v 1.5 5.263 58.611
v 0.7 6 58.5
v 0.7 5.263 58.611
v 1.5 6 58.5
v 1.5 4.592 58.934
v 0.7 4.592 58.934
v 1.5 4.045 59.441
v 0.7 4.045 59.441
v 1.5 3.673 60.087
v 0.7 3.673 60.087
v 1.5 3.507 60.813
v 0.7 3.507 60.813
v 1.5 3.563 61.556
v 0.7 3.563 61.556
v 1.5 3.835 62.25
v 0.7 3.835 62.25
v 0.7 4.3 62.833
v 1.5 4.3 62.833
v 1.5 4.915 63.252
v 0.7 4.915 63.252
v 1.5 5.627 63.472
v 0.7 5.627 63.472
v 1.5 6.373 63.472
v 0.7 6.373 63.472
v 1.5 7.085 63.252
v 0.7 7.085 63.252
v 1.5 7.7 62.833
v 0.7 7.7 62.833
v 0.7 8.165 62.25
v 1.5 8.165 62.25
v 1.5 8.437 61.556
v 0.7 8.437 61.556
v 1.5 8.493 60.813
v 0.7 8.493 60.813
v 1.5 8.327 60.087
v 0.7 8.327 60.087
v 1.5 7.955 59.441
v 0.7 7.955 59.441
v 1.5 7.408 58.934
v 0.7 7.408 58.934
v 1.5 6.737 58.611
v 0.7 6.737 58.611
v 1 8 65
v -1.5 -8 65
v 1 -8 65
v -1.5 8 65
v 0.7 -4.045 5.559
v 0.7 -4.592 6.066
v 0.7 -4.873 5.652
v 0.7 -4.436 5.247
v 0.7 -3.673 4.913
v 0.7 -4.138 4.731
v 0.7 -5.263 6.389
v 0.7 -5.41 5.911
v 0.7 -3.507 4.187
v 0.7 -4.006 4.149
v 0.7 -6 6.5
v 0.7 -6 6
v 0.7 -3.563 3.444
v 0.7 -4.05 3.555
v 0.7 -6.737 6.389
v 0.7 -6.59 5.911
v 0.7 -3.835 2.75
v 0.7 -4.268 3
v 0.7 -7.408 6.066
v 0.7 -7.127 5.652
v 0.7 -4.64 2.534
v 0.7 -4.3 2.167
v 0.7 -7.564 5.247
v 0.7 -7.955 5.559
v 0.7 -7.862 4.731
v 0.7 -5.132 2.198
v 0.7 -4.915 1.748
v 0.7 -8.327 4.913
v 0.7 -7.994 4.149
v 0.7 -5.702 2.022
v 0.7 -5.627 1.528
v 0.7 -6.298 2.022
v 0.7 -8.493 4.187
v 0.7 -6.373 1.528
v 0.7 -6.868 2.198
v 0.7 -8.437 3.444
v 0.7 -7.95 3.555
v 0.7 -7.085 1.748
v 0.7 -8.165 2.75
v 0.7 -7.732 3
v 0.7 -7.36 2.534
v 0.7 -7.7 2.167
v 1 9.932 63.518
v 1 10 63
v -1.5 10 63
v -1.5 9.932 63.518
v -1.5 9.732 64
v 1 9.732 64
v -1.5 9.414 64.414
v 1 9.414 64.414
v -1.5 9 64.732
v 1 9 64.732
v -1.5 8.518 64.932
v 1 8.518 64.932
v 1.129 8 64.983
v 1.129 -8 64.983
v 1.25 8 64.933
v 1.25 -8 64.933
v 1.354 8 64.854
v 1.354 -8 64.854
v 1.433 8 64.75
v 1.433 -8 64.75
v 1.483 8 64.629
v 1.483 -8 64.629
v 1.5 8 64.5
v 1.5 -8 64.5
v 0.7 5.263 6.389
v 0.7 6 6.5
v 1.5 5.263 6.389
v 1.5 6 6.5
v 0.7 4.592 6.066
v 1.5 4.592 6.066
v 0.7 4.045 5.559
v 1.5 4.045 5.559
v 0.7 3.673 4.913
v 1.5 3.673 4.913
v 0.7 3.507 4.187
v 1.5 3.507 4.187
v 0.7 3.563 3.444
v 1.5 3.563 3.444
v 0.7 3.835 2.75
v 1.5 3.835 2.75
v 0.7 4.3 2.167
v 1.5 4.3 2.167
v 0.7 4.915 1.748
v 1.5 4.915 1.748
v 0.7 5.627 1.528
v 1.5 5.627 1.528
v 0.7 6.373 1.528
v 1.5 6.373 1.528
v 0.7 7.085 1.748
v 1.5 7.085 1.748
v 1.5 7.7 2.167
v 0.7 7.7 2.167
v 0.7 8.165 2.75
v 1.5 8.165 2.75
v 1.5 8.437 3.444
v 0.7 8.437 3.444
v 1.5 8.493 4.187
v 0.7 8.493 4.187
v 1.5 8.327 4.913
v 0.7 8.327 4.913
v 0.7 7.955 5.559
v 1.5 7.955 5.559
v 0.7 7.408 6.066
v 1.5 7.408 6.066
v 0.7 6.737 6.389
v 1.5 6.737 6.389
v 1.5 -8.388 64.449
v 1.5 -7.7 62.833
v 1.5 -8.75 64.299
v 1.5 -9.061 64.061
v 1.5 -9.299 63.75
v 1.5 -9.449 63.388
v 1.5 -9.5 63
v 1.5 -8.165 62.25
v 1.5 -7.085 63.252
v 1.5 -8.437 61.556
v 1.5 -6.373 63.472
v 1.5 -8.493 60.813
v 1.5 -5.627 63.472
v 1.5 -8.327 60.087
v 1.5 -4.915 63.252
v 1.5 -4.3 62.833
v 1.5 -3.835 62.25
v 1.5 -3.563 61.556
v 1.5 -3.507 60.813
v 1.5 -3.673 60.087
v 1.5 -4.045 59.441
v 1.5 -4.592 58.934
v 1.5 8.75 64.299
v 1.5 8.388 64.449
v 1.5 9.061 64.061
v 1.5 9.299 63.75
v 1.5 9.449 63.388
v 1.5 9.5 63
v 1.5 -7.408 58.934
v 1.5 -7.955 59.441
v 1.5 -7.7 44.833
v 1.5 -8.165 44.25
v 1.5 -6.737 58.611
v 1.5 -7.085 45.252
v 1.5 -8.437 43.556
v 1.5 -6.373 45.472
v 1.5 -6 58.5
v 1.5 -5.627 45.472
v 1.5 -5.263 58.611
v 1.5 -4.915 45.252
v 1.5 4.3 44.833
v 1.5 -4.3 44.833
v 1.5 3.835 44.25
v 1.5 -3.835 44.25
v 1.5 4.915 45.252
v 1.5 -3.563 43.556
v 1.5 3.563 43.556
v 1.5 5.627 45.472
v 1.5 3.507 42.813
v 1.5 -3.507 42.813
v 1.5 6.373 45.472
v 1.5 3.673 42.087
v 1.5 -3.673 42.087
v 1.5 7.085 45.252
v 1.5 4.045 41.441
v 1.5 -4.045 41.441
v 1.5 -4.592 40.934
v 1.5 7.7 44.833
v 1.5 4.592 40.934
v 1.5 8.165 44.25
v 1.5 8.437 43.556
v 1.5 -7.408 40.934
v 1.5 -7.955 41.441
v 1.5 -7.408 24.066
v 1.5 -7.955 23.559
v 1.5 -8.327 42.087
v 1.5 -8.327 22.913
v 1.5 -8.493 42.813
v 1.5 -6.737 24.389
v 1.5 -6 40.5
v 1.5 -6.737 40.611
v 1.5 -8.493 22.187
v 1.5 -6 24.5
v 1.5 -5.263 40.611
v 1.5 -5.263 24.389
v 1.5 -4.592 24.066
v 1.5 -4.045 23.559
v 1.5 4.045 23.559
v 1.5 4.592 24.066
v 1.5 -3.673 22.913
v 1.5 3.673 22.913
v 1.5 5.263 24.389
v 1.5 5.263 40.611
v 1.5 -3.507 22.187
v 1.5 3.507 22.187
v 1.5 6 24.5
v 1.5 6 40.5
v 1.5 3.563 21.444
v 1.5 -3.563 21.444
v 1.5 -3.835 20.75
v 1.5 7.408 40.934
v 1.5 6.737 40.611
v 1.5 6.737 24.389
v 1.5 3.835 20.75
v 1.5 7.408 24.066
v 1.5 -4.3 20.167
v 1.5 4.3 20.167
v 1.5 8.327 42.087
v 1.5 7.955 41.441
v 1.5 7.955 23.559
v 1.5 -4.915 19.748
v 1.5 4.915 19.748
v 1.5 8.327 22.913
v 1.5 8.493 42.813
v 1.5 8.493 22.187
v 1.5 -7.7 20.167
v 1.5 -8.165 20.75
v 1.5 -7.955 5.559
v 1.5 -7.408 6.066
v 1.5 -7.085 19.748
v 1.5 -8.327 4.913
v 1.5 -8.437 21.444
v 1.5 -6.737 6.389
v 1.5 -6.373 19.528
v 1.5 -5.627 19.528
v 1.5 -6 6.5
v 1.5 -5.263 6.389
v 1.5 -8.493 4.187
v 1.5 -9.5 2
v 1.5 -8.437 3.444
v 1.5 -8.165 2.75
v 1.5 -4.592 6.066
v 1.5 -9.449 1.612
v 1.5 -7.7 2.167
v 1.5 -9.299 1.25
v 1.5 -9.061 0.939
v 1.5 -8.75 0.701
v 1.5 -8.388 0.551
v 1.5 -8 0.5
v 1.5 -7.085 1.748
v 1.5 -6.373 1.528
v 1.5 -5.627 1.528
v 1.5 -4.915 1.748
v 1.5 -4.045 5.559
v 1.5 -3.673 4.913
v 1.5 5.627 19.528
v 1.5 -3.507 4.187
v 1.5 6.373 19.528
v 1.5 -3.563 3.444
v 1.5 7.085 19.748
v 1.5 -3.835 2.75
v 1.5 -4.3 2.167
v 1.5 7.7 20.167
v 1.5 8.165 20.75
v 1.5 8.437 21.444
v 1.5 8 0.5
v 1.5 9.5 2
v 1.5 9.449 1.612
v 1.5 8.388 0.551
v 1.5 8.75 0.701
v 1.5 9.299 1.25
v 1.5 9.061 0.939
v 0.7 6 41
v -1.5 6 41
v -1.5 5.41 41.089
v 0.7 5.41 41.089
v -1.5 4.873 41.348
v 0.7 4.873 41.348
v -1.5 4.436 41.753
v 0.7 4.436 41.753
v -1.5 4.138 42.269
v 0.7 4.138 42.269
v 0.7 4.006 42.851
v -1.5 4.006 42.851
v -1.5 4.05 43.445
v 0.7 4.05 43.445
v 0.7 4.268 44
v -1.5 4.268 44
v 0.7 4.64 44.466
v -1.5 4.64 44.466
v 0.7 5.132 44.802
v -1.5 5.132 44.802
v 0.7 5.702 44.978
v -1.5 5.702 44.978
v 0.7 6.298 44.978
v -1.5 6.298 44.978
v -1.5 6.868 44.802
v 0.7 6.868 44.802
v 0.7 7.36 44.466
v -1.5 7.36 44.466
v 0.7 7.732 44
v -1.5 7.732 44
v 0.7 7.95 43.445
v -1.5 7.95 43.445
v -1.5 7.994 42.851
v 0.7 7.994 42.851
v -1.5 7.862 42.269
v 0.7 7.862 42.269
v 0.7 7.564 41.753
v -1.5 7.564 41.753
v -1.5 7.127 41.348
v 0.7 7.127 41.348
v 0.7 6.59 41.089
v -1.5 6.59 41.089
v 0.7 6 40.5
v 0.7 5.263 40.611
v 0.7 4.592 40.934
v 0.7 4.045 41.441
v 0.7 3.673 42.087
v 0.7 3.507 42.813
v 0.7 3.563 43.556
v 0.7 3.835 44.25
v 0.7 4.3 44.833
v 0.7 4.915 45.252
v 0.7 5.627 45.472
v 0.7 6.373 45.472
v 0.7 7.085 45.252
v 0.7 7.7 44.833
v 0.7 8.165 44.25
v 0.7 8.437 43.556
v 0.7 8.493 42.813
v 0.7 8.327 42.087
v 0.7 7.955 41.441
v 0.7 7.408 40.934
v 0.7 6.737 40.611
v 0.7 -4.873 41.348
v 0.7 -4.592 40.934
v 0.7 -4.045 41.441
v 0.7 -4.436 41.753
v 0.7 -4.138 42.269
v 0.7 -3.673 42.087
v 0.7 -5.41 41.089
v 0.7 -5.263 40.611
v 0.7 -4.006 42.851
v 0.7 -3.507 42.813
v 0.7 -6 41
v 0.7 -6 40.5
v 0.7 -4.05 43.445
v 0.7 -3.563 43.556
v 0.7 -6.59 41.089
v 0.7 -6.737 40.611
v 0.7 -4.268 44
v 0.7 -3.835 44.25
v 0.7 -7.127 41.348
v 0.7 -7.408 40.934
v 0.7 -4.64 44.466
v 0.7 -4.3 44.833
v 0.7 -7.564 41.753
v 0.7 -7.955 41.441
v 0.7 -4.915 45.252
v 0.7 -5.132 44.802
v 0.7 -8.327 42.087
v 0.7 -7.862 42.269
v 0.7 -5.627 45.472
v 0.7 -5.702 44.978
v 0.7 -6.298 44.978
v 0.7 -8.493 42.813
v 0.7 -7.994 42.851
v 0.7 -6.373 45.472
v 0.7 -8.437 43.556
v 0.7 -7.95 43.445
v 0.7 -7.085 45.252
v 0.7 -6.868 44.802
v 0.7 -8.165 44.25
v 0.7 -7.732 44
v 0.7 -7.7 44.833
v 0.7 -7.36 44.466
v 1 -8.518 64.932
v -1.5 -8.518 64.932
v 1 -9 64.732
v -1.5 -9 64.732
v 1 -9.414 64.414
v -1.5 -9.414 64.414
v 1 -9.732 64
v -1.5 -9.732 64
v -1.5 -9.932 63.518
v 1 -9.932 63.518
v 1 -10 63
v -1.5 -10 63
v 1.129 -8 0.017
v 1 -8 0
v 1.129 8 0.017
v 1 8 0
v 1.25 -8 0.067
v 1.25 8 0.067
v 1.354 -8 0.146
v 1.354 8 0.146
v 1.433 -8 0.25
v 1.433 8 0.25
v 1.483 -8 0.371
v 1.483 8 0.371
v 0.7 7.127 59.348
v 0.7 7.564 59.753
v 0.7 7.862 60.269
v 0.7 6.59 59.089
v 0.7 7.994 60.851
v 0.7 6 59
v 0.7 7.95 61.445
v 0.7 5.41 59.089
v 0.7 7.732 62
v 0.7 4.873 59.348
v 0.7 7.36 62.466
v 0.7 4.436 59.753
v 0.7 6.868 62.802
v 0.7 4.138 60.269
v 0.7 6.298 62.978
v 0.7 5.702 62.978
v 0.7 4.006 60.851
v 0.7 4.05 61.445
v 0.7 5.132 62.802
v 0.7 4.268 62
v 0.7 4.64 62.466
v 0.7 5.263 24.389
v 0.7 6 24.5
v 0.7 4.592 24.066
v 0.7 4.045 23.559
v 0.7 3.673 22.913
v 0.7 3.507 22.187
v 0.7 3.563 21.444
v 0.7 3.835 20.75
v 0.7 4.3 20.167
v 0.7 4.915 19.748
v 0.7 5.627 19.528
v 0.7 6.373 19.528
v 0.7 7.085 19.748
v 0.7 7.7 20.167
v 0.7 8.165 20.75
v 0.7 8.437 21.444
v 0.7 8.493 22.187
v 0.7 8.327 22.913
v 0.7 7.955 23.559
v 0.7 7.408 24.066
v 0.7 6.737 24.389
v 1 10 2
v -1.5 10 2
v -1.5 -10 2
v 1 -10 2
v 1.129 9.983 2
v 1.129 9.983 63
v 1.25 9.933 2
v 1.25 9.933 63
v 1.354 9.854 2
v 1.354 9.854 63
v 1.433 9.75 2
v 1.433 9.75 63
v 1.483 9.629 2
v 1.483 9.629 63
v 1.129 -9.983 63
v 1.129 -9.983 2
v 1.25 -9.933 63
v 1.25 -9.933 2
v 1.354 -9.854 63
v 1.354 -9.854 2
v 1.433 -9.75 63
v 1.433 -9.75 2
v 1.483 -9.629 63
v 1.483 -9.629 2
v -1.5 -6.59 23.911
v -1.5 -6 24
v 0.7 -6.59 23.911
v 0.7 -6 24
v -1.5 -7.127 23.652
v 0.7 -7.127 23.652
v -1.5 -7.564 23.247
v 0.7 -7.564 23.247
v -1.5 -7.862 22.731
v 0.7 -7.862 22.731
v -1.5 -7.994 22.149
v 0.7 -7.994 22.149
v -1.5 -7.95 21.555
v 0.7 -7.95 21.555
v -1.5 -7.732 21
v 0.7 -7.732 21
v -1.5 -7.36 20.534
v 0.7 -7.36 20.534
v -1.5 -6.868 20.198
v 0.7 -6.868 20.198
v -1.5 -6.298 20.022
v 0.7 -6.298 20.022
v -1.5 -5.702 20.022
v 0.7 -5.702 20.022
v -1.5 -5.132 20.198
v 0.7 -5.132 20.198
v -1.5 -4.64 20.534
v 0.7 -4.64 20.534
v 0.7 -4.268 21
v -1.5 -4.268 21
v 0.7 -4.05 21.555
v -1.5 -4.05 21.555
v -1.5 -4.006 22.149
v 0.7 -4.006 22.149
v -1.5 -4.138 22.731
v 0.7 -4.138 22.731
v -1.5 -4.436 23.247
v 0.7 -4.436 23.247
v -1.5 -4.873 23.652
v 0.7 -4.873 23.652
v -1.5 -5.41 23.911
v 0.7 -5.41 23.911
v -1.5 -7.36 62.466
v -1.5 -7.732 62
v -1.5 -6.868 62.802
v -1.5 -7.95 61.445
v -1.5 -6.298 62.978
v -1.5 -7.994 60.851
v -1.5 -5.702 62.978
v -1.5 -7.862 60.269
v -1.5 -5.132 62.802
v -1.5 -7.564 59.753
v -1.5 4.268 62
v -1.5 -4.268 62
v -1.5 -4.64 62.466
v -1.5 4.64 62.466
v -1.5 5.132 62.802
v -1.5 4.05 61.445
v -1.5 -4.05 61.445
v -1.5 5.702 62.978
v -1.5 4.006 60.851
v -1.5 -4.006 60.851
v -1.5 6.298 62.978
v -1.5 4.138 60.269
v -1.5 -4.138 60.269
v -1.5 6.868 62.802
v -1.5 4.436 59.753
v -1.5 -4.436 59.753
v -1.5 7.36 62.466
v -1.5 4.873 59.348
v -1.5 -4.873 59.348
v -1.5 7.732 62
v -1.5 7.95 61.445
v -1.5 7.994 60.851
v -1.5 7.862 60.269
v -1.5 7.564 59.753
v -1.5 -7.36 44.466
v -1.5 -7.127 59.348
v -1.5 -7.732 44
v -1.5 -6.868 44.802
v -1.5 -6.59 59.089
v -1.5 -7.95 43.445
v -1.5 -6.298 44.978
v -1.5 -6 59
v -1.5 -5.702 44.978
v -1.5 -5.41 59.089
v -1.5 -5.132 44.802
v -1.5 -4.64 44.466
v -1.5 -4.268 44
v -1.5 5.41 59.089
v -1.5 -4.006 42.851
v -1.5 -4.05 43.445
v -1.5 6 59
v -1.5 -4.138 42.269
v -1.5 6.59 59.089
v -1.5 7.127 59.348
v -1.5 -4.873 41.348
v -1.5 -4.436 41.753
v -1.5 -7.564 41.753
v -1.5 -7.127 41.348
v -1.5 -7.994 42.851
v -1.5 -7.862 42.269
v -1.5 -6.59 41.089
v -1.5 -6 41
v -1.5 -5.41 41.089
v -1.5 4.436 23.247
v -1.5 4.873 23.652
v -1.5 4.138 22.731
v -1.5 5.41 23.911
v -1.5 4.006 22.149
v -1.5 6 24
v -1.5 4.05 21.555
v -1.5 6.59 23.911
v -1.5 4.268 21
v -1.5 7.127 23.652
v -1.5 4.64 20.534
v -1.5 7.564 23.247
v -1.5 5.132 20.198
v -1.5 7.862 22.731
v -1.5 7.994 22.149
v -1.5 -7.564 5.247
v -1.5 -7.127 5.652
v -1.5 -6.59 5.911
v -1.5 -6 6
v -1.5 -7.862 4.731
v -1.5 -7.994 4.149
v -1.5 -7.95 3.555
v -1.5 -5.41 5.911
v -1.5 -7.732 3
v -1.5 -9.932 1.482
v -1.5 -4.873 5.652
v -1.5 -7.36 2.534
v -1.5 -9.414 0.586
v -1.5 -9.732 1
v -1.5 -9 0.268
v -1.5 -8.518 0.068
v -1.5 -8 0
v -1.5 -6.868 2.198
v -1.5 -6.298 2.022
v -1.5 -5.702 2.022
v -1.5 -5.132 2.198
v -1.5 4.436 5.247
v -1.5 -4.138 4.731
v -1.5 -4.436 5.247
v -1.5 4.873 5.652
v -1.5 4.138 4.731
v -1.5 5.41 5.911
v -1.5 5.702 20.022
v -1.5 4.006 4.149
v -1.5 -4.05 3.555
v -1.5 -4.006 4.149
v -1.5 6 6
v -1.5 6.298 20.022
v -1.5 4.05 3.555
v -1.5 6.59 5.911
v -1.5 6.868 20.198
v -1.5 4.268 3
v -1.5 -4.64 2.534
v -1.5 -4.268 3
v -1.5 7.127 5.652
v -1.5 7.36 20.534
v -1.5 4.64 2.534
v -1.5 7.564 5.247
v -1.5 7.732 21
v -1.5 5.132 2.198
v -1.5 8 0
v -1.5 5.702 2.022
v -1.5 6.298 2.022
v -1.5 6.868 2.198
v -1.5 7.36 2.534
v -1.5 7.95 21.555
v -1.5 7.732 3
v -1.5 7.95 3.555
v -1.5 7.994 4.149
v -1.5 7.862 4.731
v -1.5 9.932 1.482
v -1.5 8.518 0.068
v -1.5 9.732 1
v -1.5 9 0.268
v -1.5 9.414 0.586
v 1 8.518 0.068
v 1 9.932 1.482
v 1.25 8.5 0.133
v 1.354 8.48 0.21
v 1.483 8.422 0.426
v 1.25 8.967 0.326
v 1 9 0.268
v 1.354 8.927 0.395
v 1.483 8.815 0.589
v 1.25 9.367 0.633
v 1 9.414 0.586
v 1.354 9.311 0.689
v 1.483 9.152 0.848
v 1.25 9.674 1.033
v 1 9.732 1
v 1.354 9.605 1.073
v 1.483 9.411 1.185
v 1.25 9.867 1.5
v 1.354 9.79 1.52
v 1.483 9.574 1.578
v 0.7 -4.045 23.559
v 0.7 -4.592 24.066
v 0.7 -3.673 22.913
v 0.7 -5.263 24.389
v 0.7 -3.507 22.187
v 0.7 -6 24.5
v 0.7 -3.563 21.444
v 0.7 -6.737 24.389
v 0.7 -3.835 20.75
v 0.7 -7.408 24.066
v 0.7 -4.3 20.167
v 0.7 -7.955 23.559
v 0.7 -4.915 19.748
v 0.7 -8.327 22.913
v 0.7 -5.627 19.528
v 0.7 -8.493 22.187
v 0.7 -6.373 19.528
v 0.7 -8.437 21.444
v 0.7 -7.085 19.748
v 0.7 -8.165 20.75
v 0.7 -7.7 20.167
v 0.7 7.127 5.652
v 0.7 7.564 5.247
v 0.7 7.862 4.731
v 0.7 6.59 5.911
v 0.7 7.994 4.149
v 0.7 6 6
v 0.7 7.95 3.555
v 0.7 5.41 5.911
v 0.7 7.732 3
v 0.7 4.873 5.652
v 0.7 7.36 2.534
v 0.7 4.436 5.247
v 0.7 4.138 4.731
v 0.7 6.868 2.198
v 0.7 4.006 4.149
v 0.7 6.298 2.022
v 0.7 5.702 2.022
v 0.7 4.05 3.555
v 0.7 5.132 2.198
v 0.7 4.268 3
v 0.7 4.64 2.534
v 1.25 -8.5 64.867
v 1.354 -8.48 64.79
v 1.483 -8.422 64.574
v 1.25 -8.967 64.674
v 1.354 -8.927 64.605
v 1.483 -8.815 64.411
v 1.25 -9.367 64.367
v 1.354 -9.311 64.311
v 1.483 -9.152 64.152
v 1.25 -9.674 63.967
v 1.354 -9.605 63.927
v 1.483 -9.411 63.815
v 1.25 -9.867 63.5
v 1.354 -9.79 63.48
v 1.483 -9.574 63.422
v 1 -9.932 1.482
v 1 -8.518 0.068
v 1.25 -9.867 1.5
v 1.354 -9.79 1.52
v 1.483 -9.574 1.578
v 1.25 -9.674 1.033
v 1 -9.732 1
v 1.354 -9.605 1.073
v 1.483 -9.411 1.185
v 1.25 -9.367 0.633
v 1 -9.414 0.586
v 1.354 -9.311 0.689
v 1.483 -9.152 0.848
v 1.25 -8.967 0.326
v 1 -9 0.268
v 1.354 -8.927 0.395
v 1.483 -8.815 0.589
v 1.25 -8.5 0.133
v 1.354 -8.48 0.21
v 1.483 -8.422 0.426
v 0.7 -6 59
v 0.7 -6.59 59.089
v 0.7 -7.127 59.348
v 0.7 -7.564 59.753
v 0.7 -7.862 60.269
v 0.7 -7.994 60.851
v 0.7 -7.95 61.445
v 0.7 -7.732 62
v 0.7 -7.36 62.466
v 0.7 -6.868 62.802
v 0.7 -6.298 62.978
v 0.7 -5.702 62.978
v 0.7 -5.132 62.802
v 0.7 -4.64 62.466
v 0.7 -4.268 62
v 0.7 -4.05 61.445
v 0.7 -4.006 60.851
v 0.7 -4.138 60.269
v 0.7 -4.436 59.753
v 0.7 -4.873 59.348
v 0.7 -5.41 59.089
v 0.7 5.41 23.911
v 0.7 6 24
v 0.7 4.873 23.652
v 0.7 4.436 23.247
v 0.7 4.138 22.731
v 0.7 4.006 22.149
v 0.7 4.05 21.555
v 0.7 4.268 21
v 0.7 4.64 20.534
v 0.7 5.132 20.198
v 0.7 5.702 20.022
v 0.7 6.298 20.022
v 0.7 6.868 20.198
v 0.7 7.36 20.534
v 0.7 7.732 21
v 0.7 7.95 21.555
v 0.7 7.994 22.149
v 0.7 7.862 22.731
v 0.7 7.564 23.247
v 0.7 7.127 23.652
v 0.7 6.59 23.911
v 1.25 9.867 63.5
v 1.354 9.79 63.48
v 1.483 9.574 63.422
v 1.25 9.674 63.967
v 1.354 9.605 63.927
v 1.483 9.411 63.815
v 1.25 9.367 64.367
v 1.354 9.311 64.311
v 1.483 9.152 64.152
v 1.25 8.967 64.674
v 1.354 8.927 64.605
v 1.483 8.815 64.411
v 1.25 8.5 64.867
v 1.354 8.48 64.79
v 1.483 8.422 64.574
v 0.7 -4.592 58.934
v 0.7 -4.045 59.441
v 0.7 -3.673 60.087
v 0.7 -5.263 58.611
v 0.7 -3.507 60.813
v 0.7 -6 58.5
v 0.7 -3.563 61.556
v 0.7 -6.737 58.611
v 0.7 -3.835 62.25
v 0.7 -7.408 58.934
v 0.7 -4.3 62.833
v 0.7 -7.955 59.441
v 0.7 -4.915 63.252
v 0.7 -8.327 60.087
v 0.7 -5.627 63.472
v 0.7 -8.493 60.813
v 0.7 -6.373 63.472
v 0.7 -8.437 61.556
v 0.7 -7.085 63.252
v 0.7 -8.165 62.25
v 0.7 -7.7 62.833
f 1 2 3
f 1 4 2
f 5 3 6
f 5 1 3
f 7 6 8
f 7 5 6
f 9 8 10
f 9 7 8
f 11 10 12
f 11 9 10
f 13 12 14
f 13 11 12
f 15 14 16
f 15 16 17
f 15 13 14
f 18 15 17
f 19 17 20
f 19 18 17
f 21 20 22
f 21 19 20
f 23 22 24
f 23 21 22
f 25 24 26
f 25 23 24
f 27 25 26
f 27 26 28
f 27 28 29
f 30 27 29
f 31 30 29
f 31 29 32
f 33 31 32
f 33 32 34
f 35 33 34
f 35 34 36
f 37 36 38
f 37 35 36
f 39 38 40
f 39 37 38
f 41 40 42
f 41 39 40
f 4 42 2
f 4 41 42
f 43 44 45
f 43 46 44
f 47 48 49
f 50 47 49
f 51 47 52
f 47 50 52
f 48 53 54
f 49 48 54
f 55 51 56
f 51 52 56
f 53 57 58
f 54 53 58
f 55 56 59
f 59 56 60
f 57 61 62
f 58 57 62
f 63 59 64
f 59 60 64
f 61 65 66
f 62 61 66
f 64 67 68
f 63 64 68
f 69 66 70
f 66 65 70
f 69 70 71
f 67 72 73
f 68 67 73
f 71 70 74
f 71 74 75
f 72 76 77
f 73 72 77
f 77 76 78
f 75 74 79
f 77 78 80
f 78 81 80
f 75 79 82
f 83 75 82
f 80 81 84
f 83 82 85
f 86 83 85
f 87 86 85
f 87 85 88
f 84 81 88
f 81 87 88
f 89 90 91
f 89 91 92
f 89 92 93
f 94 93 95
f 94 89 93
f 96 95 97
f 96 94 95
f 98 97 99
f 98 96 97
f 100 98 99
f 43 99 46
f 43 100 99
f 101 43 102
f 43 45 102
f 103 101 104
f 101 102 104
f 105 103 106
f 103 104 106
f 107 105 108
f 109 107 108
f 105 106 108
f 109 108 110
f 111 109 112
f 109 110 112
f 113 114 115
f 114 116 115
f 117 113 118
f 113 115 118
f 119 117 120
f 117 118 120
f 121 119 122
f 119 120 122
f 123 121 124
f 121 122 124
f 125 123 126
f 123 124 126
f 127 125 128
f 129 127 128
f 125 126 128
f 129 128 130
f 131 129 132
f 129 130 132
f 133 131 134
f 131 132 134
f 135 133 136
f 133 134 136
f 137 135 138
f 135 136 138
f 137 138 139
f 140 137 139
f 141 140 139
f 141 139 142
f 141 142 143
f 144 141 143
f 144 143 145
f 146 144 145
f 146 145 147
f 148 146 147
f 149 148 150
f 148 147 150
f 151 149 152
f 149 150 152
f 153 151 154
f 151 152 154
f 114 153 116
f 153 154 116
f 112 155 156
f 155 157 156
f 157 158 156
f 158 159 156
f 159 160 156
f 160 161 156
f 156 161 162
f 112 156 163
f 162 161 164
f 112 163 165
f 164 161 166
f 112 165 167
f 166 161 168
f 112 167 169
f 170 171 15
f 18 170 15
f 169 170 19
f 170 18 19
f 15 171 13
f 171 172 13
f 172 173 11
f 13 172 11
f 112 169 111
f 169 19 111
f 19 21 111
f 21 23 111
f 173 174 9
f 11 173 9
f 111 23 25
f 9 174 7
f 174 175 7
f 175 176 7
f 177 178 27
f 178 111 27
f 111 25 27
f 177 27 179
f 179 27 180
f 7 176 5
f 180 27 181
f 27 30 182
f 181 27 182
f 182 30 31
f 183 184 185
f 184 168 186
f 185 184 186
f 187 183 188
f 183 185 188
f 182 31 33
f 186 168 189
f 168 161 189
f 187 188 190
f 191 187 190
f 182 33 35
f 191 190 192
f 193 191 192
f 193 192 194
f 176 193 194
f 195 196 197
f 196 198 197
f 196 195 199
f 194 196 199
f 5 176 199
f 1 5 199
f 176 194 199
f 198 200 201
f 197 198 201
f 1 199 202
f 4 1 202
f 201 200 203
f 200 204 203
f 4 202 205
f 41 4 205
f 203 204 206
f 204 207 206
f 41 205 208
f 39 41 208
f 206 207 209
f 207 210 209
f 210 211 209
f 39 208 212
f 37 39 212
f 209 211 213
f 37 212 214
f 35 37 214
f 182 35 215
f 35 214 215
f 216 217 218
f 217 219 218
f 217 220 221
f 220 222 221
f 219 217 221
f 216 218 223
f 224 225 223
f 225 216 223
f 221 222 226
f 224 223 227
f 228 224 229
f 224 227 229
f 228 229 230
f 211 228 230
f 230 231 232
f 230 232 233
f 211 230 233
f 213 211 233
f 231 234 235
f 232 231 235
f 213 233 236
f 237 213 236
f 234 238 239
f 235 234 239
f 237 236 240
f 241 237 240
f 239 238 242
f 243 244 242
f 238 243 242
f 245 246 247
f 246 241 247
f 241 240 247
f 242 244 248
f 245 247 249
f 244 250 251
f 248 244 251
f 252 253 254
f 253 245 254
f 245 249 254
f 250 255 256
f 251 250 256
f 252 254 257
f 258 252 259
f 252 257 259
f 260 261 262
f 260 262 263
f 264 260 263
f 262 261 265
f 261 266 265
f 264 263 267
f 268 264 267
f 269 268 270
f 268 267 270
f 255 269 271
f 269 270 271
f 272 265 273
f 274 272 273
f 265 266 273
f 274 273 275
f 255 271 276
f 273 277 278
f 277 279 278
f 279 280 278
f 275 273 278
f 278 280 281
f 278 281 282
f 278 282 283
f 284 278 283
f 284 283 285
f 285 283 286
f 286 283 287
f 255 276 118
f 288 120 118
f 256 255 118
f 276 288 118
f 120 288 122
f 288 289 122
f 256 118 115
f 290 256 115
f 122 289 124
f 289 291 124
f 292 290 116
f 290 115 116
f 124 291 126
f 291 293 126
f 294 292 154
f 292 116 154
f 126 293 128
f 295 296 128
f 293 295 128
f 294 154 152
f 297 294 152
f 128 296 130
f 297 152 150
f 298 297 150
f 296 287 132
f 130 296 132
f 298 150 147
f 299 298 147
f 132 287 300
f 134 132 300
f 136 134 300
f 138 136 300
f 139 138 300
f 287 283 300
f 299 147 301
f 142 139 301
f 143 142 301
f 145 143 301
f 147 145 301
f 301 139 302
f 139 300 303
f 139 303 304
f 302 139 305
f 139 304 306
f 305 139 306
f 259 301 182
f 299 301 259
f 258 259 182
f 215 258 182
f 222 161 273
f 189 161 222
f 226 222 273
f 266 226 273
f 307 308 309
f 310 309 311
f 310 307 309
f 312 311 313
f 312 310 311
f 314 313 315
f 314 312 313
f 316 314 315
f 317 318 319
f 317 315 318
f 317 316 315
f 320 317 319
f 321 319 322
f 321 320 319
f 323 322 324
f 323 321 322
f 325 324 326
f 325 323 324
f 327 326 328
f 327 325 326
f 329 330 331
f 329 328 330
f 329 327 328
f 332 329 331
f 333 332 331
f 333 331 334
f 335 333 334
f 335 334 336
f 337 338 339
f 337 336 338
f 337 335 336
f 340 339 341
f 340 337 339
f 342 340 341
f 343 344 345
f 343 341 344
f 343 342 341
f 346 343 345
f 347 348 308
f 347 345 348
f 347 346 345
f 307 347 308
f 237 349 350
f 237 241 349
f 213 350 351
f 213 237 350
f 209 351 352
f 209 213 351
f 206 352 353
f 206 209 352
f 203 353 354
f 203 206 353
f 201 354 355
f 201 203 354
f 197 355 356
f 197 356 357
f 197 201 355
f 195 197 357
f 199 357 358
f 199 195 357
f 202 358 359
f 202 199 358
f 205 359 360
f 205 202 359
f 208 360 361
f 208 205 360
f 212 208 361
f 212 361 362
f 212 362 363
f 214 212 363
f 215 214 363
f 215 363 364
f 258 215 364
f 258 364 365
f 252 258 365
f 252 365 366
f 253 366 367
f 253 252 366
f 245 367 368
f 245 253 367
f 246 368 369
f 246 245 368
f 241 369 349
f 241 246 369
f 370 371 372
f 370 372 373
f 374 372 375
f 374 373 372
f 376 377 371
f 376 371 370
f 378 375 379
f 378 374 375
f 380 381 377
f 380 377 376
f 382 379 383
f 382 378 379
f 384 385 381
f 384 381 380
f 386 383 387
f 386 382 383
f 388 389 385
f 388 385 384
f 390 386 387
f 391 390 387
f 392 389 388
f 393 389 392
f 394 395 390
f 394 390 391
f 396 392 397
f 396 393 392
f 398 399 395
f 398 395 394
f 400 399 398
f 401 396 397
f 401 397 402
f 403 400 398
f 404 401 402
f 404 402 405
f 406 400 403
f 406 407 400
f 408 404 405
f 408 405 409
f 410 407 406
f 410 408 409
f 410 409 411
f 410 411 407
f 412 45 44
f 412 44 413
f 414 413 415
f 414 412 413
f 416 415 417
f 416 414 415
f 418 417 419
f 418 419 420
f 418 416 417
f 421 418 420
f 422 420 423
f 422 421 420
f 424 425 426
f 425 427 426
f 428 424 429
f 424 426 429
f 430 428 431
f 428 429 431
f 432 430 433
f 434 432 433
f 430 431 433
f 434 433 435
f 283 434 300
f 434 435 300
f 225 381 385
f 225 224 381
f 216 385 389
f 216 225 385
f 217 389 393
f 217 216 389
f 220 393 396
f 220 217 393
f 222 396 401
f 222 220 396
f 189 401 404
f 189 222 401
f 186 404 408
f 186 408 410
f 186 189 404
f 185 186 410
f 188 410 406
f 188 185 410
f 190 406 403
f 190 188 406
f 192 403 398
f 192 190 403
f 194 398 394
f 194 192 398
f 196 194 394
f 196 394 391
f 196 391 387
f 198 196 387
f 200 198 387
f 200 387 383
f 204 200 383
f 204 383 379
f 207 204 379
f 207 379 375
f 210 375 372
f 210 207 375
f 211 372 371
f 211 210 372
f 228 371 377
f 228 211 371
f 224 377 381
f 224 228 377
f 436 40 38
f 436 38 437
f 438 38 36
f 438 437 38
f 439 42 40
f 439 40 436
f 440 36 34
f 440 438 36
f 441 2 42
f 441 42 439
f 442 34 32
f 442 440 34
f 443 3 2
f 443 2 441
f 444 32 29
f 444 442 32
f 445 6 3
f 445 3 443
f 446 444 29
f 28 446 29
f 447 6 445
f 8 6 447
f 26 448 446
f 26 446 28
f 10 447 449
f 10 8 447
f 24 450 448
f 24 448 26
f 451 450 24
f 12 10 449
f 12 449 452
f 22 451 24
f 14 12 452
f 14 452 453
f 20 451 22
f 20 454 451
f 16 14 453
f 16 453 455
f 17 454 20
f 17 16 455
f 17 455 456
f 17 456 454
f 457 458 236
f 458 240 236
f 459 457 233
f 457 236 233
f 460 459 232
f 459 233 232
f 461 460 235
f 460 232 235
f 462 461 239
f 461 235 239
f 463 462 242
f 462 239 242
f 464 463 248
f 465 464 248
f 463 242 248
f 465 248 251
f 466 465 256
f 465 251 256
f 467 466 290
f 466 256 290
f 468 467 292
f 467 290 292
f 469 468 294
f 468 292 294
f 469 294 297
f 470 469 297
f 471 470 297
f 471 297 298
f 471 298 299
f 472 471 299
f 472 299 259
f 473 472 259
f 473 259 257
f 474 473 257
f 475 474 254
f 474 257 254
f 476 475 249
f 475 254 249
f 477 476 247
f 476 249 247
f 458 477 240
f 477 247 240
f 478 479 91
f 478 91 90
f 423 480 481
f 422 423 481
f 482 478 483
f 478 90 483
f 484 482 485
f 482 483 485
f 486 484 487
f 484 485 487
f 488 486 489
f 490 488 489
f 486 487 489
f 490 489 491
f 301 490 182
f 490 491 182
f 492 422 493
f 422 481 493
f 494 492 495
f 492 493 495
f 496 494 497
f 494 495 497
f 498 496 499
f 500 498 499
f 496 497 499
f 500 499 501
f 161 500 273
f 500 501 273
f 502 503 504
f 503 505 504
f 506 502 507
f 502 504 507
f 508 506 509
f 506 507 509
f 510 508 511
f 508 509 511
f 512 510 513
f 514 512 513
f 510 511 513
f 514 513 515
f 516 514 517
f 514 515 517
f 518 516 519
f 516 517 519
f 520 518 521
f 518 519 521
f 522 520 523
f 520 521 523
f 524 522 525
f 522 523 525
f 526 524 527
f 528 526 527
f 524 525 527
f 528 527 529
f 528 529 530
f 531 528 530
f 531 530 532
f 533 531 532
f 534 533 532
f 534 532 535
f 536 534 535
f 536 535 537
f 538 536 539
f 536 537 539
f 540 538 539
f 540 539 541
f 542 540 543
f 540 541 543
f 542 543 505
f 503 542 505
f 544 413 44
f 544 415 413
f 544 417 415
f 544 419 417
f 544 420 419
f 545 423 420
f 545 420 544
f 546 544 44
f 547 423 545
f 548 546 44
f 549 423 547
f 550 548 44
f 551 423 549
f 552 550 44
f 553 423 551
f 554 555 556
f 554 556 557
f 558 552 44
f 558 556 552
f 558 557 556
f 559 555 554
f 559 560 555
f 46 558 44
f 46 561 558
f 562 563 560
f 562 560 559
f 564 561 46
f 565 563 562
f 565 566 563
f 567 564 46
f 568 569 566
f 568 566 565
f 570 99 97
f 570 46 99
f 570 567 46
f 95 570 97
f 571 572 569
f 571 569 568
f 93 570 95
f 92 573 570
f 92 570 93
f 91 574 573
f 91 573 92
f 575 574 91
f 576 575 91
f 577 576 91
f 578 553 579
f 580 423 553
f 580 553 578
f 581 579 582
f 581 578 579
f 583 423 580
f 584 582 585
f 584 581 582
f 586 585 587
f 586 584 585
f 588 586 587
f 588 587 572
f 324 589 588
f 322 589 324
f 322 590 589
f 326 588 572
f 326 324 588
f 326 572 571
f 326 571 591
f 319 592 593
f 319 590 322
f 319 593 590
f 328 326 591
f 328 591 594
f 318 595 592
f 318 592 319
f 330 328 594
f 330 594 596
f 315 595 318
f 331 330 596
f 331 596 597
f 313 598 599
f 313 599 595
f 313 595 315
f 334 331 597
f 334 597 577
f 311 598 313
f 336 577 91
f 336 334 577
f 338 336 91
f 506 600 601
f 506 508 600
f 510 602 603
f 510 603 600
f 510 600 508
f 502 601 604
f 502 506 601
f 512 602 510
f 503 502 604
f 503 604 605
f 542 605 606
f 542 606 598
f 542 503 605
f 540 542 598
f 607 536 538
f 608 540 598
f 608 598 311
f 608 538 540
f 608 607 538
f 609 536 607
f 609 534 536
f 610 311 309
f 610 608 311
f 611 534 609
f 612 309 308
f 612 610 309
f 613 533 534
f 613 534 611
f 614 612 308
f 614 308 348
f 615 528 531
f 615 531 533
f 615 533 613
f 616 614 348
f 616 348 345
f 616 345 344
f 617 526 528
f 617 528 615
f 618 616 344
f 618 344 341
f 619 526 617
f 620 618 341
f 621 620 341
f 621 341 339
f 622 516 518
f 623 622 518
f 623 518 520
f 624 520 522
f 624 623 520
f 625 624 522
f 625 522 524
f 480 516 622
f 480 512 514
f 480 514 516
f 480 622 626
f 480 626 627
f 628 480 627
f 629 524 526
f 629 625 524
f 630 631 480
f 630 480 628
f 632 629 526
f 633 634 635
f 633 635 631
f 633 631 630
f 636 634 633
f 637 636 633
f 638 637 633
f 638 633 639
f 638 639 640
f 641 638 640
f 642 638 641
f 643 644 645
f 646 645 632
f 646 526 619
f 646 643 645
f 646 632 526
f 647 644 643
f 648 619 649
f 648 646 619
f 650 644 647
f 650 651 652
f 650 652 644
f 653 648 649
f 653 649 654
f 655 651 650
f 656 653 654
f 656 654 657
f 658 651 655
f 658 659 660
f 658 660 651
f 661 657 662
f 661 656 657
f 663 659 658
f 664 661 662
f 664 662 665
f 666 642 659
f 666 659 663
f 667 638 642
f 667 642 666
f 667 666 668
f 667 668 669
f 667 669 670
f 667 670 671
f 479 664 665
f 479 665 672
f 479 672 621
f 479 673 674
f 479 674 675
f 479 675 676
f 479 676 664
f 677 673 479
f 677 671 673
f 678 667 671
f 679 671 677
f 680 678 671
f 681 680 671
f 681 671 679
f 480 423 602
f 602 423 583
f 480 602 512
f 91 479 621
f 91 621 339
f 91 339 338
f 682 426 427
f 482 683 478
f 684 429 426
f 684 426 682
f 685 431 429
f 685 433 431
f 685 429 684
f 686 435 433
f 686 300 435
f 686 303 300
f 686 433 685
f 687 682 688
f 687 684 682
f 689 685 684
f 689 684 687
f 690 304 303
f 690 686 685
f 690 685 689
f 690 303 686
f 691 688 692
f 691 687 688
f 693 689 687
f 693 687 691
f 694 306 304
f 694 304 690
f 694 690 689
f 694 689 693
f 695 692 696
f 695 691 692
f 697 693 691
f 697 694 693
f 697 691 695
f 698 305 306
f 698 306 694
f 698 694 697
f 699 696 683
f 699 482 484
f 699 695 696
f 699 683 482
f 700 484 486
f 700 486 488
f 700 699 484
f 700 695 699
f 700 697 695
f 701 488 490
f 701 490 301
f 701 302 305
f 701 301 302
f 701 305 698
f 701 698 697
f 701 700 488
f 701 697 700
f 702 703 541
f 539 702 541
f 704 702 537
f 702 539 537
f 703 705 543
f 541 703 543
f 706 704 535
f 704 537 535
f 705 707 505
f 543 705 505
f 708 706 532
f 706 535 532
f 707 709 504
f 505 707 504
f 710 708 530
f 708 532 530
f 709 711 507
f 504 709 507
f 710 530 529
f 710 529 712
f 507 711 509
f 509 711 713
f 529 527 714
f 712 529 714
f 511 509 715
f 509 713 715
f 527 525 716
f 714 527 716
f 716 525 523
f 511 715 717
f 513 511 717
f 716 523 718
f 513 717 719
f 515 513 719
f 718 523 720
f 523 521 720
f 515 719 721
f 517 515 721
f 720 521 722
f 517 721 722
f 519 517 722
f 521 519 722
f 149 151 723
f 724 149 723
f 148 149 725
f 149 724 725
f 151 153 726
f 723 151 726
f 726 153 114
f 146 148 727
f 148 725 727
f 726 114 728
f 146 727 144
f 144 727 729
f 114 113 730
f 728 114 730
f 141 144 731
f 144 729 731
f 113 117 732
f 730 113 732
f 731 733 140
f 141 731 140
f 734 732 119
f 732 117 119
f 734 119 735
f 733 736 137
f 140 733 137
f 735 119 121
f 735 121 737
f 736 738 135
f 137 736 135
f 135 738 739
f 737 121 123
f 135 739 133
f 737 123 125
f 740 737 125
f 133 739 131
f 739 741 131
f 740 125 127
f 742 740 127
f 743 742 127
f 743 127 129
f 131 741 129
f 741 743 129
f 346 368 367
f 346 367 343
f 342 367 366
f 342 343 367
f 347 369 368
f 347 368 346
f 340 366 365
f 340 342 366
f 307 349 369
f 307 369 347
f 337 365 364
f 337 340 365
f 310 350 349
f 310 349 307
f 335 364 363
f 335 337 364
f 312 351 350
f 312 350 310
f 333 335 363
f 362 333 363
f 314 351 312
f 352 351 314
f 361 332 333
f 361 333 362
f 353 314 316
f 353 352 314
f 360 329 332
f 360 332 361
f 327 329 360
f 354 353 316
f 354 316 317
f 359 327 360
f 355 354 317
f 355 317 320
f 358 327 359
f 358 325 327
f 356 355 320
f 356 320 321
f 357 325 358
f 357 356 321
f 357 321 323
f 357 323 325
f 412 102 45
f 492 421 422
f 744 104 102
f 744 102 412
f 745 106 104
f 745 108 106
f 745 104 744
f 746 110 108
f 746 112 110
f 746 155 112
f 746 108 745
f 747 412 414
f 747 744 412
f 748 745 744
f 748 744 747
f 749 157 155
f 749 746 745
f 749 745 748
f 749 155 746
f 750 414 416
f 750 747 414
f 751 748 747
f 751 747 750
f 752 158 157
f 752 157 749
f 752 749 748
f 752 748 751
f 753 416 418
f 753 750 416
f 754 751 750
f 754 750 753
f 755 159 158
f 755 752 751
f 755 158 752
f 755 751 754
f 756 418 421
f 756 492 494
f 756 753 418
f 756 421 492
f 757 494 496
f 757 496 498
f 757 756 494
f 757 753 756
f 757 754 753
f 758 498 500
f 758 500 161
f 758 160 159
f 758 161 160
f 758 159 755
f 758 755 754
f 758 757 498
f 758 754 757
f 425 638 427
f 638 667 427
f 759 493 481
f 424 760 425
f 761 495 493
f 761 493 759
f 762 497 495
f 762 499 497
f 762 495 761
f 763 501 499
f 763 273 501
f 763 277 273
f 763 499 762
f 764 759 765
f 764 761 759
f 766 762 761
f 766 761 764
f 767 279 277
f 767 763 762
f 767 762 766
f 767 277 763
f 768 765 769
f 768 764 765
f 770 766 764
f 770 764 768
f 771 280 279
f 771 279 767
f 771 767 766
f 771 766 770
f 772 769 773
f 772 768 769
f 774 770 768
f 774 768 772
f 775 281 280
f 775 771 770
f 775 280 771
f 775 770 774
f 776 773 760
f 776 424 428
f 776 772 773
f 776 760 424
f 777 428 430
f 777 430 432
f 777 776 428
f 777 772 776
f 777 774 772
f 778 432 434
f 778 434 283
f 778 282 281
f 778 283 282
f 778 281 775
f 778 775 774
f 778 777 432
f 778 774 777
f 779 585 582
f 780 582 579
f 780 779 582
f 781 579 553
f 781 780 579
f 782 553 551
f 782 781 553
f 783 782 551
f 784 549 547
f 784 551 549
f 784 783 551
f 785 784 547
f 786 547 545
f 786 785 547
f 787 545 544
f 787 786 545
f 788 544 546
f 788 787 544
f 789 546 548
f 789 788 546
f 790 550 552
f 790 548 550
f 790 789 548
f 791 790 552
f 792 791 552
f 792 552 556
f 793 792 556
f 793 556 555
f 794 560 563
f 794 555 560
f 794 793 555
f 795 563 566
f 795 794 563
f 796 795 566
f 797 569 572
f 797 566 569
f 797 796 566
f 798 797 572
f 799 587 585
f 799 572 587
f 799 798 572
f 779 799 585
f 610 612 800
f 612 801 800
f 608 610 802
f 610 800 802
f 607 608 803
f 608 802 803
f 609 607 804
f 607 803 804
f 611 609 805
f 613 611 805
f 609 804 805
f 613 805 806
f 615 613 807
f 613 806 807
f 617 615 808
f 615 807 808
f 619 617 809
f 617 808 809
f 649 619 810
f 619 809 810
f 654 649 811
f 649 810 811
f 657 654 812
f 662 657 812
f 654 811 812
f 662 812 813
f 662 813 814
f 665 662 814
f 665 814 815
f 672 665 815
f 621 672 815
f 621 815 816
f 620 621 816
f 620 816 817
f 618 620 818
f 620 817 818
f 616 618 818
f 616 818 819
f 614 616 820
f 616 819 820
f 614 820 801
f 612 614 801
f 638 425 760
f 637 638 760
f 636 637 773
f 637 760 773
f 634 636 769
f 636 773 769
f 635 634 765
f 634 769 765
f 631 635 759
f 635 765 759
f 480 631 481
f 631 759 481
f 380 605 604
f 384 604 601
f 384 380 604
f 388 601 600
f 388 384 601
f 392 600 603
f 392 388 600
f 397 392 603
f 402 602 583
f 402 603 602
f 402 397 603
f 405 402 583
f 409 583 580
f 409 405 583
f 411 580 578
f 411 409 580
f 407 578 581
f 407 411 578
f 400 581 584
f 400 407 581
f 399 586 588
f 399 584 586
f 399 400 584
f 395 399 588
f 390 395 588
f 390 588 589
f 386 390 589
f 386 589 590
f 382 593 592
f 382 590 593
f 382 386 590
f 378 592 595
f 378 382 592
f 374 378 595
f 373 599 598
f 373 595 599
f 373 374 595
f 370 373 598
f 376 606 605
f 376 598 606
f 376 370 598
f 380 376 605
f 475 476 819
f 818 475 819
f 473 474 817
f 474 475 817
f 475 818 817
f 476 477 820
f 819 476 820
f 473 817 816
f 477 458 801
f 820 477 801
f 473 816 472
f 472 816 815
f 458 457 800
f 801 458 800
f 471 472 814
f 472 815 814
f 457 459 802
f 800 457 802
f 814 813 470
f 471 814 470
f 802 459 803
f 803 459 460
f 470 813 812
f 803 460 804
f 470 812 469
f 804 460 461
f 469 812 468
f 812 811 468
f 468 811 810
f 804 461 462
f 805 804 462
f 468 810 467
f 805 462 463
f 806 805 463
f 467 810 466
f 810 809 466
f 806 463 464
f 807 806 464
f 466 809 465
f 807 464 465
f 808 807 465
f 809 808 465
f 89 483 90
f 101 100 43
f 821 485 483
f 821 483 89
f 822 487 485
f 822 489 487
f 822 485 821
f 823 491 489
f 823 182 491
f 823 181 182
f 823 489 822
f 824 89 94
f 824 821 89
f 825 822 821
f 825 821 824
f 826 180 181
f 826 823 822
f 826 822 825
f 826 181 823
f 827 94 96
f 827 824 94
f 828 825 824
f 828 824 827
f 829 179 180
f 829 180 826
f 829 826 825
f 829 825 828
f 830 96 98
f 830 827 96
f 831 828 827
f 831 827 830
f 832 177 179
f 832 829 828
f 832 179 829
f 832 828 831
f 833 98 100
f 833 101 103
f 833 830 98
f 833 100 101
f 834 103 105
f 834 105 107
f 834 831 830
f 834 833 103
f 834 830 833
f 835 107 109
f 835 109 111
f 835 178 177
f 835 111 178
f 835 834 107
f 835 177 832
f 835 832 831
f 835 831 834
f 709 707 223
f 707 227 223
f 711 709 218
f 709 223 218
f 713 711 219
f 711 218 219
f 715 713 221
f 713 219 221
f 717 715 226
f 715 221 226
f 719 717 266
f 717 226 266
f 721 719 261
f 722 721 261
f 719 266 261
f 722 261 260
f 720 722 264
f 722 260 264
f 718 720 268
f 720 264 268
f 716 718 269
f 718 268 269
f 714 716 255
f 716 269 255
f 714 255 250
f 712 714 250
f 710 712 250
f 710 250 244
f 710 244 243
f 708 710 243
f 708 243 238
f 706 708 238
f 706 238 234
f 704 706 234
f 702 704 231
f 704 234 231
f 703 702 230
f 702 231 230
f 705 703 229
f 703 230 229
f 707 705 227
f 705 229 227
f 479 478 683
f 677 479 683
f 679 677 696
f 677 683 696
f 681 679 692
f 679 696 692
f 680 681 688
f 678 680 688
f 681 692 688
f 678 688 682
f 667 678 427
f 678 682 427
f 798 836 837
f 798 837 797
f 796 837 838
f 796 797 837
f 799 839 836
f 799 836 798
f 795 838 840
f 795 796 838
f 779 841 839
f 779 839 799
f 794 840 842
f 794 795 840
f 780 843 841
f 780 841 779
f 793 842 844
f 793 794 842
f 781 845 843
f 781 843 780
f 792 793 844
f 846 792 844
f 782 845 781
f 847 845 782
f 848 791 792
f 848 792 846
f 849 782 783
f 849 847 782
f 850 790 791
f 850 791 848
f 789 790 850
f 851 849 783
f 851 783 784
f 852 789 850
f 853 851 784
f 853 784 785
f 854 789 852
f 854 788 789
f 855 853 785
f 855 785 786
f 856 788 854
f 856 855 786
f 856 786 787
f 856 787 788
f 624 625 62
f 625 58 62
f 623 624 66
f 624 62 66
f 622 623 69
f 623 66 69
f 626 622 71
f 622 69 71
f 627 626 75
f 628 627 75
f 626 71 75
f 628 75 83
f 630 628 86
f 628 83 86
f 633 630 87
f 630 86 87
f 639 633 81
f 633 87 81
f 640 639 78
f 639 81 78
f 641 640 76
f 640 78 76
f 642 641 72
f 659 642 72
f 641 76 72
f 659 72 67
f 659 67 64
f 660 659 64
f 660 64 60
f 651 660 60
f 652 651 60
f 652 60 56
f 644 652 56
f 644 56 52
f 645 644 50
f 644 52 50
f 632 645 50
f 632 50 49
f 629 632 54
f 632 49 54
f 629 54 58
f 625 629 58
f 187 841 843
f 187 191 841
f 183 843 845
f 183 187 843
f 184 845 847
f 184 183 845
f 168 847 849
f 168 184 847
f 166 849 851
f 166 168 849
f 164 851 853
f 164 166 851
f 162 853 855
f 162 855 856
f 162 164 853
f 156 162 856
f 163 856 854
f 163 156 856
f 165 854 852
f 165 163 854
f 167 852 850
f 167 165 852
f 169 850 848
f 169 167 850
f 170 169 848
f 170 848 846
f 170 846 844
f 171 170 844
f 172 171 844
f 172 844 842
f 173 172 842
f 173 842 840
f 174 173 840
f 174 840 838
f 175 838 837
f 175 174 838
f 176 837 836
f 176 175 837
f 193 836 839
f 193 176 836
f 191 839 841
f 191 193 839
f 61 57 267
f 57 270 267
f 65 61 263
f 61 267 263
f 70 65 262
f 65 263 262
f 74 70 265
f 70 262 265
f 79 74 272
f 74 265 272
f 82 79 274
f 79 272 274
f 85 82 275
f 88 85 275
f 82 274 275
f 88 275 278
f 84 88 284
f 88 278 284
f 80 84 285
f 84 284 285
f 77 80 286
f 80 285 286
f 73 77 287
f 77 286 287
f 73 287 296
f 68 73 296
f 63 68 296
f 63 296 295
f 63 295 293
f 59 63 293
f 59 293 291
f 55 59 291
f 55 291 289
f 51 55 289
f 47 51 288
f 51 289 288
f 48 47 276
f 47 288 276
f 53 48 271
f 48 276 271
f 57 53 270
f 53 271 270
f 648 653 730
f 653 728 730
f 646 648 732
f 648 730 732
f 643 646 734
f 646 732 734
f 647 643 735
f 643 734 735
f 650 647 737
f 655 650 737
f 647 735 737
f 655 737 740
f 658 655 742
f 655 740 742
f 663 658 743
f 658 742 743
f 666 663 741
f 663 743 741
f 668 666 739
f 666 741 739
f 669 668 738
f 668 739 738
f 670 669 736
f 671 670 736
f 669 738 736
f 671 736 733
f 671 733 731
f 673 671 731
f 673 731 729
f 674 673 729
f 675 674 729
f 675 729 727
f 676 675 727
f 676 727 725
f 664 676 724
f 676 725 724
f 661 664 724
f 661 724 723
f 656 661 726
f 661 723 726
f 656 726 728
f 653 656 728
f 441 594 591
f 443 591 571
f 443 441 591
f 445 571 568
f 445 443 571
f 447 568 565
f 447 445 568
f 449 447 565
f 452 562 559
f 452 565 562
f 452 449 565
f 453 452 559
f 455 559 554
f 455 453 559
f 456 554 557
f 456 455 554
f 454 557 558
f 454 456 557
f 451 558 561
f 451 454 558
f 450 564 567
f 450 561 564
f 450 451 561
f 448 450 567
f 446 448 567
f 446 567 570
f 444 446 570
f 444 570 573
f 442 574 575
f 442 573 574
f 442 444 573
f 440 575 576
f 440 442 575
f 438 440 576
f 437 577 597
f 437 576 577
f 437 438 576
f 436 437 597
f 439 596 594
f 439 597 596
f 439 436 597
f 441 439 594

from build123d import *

# Parameters (mm, degrees)
SKETCH2_W            = 3
SKETCH2_H            = 20
BOSS_EXTRUDE2_DEPTH  = 65
FILLET3_R            = 2
FILLET4_R            = 2
FILLET5_R            = 2
FILLET6_R            = 2
LPATTERN1_COUNT      = 2
LPATTERN1_PITCH      = 18
LPATTERN1_COUNT_DIR2 = 2
LPATTERN1_PITCH_DIR2 = 12
FILLET7_R            = 0.5


with BuildPart() as part:
    # Sketch2 → Boss-Extrude2 (new body)
    with BuildSketch(Plane.XY):
        Rectangle(SKETCH2_W, SKETCH2_H)
    extrude(amount=BOSS_EXTRUDE2_DEPTH)

    # Fillet3
    fillet3_edges = [part.edges().sort_by_distance(p)[0] for p in [
        (0, 10, 65),
    ]]
    fillet(fillet3_edges, radius=FILLET3_R)

    # Fillet4
    fillet4_edges = [part.edges().sort_by_distance(p)[0] for p in [
        (0, -10, 65),
    ]]
    fillet(fillet4_edges, radius=FILLET4_R)

    # Fillet5
    fillet5_edges = [part.edges().sort_by_distance(p)[0] for p in [
        (0, 10, 0),
    ]]
    fillet(fillet5_edges, radius=FILLET5_R)

    # Fillet6
    fillet6_edges = [part.edges().sort_by_distance(p)[0] for p in [
        (0, -10, 0),
    ]]
    fillet(fillet6_edges, radius=FILLET6_R)

    # Sketch4 → CBORE for M5 Hex Head Bolt1 (revolve, cut)
    with BuildSketch(Plane(origin=(1.5, 6, 61), x_dir=(0, 0, -1), z_dir=(0, 1, 0))):
        Polygon((0, 0), (0, 5.178090033), (2, 4), (2, 0.8), (2.5, 0.8), (2.5, 0), align=None)
    cbore_for_m5_hex_head_bolt1 = revolve(axis=Axis((7.85, 6, 61), (-1, 0, 0)), mode=Mode.SUBTRACT)

    # LPattern1: CBORE for M5 Hex Head Bolt1 2 × 2
    with Locations(*[(0, -j * LPATTERN1_PITCH_DIR2, -i * LPATTERN1_PITCH) for i in range(LPATTERN1_COUNT) for j in range(LPATTERN1_COUNT_DIR2) if (i, j) != (0, 0)]):
        add(cbore_for_m5_hex_head_bolt1, mode=Mode.SUBTRACT)

    # Mirror16: CBORE for M5 Hex Head Bolt1 across plane
    add(cbore_for_m5_hex_head_bolt1.mirror(Plane.XY.offset(32.5)), mode=Mode.SUBTRACT)

    # Mirror16 copy 1 sketch → Mirror16 copy 1 (revolve, cut)
    with BuildSketch(Plane(origin=(1.5, -6, 4), x_dir=(0, 0, 1), z_dir=(0, 1, 0))):
        Polygon((0, 0), (0, -5.178090033), (2, -4), (2, -0.8), (2.5, -0.8), (2.5, 0), align=None)
    revolve(axis=Axis((7.85, -6, 4), (1, 0, 0)), mode=Mode.SUBTRACT)

    # Mirror16 copy 2 sketch → Mirror16 copy 2 (revolve, cut)
    with BuildSketch(Plane(origin=(1.5, 6, 22), x_dir=(0, 0, 1), z_dir=(0, 1, 0))):
        Polygon((0, 0), (0, -5.178090033), (2, -4), (2, -0.8), (2.5, -0.8), (2.5, 0), align=None)
    revolve(axis=Axis((7.85, 6, 22), (1, 0, 0)), mode=Mode.SUBTRACT)

    # Mirror16 copy 3 sketch → Mirror16 copy 3 (revolve, cut)
    with BuildSketch(Plane(origin=(1.5, -6, 22), x_dir=(0, 0, 1), z_dir=(0, 1, 0))):
        Polygon((0, 0), (0, -5.178090033), (2, -4), (2, -0.8), (2.5, -0.8), (2.5, 0), align=None)
    revolve(axis=Axis((7.85, -6, 22), (1, 0, 0)), mode=Mode.SUBTRACT)

    # Fillet7
    fillet7_edges = [part.edges().sort_by_distance(p)[0] for p in [
        (1.5, 10, 32.5),
        (1.5, 9.414213562, 64.414213562),
        (1.5, 0, 65),
        (1.5, -10, 32.5),
        (1.5, -9.414213562, 64.414213562),
        (1.5, 9.414213562, 0.585786438),
        (1.5, 0, 0),
        (1.5, -9.414213562, 0.585786438),
    ]]
    fillet(fillet7_edges, radius=FILLET7_R)


solid = part.part
